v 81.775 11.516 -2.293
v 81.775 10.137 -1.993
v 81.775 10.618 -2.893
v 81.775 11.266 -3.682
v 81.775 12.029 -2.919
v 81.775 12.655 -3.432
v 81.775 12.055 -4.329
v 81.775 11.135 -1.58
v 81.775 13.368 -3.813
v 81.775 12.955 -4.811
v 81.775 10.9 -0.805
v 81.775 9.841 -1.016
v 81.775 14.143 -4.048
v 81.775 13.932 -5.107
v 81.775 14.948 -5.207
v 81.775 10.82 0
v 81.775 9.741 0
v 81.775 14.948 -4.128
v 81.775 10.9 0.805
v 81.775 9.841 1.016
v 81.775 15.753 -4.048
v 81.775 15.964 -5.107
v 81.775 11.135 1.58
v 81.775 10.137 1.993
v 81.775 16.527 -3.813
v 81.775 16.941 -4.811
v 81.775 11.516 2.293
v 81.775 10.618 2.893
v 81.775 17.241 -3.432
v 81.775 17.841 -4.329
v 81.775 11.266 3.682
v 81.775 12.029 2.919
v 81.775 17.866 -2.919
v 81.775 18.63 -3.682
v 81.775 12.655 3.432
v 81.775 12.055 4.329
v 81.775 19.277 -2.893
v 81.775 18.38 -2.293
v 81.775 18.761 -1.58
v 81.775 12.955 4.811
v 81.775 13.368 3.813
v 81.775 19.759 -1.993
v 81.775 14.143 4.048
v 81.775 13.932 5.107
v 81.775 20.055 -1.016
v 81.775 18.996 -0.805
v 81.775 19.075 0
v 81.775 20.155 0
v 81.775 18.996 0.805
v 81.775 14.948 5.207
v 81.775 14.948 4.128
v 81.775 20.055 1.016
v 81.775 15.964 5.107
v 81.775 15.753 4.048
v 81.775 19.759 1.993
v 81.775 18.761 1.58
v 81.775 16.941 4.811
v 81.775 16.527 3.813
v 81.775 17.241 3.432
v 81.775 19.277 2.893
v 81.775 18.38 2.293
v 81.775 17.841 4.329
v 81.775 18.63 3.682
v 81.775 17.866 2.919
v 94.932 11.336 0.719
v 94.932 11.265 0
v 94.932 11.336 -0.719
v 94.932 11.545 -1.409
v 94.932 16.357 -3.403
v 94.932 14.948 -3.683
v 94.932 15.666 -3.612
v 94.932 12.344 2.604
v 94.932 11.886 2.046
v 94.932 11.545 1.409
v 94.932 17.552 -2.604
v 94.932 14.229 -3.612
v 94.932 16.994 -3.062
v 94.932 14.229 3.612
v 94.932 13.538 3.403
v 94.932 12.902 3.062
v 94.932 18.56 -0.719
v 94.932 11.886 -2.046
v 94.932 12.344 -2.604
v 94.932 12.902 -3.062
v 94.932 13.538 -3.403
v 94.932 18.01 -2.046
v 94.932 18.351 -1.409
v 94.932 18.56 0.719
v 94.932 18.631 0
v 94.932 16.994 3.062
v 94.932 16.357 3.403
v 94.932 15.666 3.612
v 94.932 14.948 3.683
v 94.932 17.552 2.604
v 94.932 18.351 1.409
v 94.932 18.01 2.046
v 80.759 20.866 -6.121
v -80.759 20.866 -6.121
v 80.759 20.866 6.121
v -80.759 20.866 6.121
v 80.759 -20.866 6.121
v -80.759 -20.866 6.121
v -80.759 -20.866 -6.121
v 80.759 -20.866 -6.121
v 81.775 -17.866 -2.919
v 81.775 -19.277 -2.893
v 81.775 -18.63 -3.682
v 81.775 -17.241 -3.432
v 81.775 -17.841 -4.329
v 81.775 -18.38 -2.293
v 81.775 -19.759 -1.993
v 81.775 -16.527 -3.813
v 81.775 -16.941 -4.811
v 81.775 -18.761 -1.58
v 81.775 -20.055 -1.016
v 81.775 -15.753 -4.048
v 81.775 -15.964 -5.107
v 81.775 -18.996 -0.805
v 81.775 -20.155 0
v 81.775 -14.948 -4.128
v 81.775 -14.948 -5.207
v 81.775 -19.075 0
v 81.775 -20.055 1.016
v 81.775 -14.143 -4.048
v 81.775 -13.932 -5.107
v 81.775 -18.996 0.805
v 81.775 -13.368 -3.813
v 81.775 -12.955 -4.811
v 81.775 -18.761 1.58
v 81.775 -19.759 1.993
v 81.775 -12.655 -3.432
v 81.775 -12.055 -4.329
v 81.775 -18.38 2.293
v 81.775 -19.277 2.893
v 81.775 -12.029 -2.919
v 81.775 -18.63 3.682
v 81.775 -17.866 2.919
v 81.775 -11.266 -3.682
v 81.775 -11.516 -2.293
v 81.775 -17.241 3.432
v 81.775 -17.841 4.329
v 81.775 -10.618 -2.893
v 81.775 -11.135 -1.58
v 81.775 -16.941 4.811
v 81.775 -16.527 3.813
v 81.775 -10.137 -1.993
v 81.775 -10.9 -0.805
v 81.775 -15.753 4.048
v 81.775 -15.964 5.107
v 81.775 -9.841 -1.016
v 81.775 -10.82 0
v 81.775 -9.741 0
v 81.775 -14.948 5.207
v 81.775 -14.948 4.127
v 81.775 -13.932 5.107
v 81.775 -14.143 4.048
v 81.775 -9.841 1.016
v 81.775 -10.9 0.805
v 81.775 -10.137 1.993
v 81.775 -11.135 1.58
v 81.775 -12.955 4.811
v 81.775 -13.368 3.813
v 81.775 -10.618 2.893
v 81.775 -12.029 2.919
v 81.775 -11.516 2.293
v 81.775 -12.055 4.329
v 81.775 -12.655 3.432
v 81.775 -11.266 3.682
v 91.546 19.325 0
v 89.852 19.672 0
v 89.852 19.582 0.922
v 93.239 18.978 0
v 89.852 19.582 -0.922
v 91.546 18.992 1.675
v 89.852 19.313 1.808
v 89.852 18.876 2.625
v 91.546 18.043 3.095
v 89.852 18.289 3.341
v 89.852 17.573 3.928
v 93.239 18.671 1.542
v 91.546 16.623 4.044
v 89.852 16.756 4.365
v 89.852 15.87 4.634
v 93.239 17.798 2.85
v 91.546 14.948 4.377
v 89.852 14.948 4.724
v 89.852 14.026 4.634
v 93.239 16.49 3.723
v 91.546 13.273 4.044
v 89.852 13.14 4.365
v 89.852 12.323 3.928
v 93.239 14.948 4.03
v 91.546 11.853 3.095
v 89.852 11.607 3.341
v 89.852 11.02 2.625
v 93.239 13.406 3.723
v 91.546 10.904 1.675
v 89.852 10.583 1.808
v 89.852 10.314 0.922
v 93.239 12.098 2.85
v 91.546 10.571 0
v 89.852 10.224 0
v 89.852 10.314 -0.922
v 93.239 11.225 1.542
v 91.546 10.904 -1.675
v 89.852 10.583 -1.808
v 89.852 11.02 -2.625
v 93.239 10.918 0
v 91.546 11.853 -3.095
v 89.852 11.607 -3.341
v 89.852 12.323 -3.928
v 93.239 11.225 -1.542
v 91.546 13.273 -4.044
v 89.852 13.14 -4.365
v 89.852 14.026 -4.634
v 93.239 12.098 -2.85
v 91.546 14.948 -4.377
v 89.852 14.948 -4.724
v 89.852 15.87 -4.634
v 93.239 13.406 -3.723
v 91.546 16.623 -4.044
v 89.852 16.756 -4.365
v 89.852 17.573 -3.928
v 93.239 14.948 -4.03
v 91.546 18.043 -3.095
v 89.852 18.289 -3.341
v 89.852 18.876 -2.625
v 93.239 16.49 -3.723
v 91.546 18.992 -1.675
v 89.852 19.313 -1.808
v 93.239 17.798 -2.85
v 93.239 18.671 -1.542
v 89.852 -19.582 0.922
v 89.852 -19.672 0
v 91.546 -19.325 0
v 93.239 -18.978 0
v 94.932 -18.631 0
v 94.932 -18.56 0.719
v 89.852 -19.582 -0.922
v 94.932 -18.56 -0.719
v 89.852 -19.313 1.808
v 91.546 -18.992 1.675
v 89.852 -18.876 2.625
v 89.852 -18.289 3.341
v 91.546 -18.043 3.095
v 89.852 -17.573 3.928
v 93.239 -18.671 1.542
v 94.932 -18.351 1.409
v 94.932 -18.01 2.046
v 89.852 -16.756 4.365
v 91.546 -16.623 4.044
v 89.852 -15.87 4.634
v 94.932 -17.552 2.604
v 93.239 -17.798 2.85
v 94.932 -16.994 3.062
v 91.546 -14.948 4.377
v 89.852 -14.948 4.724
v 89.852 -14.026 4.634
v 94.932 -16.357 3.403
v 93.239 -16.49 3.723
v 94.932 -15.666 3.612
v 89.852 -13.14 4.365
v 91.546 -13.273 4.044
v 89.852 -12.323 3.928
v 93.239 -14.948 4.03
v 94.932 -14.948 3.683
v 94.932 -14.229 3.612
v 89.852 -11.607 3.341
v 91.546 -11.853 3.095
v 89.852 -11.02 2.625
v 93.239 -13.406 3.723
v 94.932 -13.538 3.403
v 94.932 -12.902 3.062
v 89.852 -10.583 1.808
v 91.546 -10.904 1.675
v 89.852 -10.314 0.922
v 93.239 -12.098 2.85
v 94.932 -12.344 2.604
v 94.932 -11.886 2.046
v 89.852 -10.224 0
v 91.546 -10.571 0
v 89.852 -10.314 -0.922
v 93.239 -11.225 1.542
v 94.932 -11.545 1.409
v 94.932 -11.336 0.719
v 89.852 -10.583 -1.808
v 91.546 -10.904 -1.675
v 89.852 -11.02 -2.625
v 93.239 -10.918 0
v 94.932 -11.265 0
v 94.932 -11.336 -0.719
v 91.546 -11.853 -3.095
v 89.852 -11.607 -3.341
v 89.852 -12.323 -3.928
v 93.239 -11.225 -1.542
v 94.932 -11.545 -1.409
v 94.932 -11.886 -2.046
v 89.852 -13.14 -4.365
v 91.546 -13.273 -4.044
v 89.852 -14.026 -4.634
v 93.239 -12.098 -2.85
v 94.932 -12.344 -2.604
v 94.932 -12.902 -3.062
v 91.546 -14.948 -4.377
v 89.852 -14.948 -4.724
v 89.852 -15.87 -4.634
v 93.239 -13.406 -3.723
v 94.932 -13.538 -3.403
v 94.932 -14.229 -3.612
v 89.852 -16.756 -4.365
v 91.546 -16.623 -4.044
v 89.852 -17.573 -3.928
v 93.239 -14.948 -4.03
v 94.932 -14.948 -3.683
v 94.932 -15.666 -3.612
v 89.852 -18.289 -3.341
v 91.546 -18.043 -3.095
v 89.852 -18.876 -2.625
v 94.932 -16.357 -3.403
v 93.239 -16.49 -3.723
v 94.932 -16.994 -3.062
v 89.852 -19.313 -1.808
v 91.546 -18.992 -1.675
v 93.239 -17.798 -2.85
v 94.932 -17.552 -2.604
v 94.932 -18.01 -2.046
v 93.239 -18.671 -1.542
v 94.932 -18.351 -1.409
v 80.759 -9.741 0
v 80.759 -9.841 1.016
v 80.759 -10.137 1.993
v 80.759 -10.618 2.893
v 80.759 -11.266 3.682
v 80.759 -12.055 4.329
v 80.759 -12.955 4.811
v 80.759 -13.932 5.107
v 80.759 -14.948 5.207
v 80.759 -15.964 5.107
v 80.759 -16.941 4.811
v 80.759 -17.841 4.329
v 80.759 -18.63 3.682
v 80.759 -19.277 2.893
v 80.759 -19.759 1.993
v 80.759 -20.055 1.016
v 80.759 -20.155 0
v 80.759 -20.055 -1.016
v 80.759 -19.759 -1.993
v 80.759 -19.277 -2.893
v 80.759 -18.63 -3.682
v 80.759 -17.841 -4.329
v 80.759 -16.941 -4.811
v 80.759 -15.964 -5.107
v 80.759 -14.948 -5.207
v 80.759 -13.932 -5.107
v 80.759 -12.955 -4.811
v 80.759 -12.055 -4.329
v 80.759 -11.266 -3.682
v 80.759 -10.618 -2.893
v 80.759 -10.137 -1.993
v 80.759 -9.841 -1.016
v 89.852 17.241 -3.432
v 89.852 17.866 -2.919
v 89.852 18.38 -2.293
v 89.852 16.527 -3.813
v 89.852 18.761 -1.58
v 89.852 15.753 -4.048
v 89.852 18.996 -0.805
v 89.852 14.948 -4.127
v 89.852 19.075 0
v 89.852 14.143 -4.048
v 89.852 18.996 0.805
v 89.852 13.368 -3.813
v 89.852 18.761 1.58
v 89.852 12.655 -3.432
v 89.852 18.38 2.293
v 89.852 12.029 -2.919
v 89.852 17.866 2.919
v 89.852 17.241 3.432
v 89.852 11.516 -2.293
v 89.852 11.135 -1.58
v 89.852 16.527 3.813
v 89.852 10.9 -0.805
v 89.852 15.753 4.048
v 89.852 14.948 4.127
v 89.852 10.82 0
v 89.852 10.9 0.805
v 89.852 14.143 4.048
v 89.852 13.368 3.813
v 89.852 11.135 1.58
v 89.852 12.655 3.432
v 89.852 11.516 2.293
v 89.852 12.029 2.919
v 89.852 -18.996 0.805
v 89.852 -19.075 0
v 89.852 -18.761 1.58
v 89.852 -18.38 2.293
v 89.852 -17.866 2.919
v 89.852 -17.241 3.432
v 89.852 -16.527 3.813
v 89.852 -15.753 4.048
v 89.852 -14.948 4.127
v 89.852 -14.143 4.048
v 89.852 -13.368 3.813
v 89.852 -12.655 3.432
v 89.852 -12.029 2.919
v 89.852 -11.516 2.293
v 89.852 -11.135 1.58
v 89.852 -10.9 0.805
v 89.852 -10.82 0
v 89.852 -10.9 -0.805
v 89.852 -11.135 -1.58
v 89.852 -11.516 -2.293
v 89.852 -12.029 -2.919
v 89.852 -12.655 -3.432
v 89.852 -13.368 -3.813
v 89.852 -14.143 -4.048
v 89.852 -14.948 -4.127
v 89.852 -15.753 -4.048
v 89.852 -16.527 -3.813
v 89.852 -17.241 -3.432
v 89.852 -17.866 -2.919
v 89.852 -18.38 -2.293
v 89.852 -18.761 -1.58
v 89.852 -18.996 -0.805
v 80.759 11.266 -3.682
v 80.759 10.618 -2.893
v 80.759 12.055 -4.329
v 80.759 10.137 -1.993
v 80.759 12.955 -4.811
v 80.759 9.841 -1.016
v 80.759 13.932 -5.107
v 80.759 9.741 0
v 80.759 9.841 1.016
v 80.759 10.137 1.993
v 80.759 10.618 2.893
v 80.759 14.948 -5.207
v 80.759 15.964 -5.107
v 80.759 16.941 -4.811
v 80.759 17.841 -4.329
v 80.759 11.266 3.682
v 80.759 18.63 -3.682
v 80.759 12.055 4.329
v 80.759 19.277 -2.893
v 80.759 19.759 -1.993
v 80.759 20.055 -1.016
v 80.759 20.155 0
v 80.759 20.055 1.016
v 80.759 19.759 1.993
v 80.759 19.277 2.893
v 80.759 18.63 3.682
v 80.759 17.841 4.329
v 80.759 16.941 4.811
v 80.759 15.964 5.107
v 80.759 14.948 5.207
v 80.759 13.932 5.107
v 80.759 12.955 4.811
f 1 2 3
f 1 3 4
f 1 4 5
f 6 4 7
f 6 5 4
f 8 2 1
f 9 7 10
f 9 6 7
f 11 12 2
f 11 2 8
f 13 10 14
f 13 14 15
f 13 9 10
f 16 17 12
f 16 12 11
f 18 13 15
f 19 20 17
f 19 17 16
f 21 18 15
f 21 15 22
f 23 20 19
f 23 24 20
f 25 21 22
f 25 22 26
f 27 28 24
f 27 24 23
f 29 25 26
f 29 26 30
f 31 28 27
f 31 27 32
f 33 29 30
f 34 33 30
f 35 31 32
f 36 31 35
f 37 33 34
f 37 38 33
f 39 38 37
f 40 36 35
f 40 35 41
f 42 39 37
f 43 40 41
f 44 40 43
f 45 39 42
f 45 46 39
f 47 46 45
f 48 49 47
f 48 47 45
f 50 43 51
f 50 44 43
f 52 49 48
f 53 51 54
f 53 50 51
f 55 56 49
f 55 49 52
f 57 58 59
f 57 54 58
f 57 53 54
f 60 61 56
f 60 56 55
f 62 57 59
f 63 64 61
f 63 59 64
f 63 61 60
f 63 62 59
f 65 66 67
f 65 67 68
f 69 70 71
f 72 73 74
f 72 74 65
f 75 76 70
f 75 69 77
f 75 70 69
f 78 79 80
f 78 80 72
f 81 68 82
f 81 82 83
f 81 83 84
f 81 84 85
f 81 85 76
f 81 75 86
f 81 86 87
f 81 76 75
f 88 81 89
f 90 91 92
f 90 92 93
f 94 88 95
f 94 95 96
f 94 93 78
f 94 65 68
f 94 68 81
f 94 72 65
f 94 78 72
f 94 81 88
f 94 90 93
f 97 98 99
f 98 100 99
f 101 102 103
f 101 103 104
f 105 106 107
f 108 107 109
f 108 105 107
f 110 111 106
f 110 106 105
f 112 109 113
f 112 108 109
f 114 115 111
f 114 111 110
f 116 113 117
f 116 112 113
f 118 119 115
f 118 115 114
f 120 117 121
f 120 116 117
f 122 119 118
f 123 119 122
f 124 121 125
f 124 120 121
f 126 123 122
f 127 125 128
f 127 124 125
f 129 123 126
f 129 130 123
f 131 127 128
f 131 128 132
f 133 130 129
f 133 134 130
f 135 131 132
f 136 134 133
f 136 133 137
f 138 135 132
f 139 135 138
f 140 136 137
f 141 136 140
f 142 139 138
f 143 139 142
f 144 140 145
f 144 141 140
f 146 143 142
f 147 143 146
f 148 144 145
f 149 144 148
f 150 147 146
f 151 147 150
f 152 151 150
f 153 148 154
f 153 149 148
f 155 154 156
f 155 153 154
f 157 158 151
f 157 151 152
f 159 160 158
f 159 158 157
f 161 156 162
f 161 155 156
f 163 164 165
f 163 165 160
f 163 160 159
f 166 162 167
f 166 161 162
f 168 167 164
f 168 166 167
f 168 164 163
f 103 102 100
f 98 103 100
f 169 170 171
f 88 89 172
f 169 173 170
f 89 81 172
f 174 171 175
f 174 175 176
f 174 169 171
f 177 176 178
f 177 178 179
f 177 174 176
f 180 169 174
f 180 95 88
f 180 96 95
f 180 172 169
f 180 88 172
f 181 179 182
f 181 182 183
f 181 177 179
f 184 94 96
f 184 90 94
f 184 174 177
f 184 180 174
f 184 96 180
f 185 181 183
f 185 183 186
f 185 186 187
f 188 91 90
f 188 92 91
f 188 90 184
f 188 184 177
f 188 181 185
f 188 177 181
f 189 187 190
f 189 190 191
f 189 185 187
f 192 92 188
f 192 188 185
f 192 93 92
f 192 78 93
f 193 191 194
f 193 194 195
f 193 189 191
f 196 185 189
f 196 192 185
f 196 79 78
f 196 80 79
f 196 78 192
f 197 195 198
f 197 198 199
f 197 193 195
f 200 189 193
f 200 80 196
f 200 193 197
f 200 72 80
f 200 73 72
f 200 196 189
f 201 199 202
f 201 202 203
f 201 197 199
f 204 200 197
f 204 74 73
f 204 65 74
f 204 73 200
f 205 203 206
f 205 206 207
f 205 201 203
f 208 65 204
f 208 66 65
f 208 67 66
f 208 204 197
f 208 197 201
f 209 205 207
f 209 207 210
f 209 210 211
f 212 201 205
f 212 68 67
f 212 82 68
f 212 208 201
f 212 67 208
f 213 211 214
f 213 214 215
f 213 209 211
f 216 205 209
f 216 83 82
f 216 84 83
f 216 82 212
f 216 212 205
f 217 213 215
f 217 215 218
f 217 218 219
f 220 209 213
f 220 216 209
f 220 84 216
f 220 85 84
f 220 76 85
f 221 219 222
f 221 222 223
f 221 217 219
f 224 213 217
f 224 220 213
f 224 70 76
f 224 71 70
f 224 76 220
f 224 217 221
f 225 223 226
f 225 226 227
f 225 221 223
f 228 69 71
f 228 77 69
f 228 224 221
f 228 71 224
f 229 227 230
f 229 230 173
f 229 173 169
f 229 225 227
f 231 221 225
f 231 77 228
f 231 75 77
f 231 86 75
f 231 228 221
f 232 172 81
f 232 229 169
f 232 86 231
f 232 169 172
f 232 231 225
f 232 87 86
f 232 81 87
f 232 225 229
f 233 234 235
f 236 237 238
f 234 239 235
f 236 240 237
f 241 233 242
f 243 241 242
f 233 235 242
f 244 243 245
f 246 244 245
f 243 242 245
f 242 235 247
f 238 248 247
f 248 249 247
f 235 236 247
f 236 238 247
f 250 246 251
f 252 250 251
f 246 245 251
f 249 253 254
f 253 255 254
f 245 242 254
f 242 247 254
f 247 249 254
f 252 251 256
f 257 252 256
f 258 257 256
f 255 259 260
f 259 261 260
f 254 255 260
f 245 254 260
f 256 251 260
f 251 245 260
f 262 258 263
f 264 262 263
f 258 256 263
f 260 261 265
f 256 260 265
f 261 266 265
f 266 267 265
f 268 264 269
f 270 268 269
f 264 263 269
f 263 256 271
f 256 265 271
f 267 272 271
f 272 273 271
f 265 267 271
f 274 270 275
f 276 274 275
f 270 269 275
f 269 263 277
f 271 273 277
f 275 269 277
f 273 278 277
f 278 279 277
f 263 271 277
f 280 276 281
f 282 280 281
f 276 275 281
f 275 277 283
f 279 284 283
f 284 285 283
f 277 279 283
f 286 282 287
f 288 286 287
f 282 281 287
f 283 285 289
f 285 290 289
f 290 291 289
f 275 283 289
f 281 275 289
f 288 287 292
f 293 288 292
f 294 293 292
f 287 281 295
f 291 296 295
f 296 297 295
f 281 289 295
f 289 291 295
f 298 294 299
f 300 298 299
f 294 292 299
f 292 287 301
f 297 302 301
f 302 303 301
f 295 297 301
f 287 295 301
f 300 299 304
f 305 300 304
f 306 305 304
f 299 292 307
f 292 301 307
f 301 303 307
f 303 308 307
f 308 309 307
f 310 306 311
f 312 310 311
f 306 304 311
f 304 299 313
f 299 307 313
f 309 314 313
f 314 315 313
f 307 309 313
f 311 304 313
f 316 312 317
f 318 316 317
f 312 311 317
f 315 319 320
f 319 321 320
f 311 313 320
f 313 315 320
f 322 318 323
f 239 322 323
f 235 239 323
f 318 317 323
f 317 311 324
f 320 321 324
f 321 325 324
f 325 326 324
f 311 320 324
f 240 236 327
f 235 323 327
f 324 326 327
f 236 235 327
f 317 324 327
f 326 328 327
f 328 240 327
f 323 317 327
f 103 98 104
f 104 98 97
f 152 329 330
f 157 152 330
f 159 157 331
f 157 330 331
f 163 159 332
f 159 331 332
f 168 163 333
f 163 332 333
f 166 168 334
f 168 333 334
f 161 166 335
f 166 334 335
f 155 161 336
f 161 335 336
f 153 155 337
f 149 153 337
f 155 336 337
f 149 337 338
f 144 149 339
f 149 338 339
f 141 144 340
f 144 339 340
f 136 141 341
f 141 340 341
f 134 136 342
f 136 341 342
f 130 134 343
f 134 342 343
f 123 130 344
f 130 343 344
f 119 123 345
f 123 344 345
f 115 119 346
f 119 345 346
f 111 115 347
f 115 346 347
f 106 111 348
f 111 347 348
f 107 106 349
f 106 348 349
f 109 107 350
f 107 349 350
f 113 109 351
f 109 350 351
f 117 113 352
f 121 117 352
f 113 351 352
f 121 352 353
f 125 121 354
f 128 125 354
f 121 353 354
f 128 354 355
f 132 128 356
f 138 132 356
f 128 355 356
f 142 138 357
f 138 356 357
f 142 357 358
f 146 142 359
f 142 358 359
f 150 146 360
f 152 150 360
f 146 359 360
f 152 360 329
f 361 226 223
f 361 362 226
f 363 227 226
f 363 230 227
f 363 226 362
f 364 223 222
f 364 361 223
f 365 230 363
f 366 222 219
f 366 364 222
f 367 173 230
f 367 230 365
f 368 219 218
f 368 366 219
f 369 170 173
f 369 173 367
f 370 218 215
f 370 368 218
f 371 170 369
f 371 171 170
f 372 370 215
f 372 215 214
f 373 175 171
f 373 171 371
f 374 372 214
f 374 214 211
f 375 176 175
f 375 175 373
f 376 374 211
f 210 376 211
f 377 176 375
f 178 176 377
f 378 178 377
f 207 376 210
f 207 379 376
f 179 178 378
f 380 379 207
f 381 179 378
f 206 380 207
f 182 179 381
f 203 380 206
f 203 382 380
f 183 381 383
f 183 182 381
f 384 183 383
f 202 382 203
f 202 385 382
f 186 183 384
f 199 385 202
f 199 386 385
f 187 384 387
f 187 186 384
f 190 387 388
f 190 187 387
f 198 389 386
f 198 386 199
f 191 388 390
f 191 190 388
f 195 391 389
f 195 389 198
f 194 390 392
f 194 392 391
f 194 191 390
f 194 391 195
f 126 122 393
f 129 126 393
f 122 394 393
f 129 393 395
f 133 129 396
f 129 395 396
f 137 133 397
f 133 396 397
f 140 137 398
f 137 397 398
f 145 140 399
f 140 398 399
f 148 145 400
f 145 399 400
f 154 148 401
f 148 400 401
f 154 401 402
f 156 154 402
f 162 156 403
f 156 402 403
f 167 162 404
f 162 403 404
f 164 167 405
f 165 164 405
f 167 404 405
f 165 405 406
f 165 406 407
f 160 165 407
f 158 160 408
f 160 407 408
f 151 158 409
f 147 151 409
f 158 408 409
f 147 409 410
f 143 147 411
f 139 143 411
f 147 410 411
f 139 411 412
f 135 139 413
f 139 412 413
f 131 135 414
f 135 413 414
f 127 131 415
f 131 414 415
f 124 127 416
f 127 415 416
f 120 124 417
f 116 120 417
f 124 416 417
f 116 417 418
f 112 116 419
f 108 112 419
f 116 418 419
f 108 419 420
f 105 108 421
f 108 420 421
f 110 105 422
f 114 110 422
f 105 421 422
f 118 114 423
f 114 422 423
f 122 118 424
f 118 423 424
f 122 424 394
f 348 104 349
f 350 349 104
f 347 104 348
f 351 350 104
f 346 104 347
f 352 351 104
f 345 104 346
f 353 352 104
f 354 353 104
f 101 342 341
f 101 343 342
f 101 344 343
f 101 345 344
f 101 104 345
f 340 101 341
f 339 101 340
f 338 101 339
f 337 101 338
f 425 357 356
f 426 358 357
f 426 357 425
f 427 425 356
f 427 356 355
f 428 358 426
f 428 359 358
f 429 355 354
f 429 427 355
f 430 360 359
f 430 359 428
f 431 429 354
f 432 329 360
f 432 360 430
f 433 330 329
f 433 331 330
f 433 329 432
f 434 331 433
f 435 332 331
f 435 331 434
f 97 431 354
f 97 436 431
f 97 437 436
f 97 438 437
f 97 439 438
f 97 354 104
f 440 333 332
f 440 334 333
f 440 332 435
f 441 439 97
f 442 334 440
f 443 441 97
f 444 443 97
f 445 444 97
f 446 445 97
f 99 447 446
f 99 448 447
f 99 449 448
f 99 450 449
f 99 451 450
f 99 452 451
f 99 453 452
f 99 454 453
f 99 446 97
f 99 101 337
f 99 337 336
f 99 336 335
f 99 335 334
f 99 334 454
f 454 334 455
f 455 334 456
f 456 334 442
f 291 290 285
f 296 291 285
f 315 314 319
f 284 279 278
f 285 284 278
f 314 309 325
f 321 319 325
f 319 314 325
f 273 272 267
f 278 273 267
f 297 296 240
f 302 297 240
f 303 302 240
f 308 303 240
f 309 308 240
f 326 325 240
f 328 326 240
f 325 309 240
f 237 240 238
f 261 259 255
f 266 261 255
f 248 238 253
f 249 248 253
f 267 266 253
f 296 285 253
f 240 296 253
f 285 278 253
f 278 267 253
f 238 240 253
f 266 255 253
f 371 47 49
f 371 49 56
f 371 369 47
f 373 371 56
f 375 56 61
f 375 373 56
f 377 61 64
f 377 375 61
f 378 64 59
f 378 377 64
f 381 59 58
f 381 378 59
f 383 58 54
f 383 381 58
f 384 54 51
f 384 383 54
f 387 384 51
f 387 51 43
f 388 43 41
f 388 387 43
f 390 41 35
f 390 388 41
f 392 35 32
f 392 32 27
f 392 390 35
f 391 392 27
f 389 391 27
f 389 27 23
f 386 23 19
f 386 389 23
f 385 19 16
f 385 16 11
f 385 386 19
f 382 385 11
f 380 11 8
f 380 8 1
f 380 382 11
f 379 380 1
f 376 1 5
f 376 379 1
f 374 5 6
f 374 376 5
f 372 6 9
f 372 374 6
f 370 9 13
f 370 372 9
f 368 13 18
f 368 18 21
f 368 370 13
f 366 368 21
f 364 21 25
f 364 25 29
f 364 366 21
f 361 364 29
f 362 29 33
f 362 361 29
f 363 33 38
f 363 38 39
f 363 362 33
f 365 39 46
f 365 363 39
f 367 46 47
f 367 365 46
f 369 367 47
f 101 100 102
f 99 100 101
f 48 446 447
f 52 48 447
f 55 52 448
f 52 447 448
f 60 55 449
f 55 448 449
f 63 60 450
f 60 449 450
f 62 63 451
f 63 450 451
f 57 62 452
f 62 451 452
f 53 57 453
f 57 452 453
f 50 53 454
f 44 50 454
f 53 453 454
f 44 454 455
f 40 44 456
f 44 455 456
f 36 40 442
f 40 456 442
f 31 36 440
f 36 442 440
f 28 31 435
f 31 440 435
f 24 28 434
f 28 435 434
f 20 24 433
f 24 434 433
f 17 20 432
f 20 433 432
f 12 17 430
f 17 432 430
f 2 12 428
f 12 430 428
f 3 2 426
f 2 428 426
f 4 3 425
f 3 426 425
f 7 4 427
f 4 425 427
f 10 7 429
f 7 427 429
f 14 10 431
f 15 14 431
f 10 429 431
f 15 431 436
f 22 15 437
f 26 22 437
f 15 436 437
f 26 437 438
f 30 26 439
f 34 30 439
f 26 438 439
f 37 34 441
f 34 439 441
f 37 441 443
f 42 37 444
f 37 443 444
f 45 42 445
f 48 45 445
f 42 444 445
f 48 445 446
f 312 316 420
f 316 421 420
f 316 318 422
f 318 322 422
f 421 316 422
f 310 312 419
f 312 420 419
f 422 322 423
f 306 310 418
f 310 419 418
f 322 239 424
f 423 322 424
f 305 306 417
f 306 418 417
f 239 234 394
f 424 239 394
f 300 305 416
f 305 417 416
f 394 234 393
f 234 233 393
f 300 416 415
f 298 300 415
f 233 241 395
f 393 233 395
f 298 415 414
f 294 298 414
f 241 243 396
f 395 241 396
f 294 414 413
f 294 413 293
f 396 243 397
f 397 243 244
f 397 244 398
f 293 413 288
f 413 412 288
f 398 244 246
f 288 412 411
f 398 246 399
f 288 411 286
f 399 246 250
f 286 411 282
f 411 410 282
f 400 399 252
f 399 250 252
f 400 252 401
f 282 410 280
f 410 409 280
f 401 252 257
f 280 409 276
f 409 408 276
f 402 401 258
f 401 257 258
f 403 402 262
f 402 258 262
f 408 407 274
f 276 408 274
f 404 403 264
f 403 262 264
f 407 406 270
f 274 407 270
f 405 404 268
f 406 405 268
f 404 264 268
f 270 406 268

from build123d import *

# Parameters (mm, degrees)
F0_W     = 161.5186
F0_H     = 41.7322
F1_DEPTH = 6.1214
F7_R     = 5.207
F7_R_2   = 4.1275
F8_DEPTH = 1.016


with BuildPart() as f1:
    # F0 (on Top) → F1 (new body, symmetric)
    with BuildSketch(Plane.XY):
        Rectangle(F0_W, F0_H)
    extrude(amount=F1_DEPTH, both=True)

    # F2 (on Top) → F3 (revolve)
    with BuildSketch(Plane.XY):
        Polygon((80.7593, -14.9479), (80.7593, -19.0754), (89.8525, -19.0754), (89.8525, -19.6723), (94.9325, -18.6309), (94.9325, -14.9479), align=None)
    revolve(axis=Axis((87.8459, -14.9479, 0), (-1, 0, 0)))

    # F4: F1 across plane


with BuildPart() as f1_1:
    add(f1.part)
    add(f1.part.mirror(Plane.XZ))

    # F7 (on face) → F8 (join)
    with BuildSketch(Plane.YZ.offset(80.7593)):
        with Locations((-14.9479, 0)):
            Circle(F7_R)
        with Locations((-14.9479, 0)):
            Circle(F7_R_2, mode=Mode.SUBTRACT)
        with Locations((14.9479, 0)):
            Circle(F7_R)
        with Locations((14.9479, 0)):
            Circle(F7_R_2, mode=Mode.SUBTRACT)
    extrude(amount=F8_DEPTH)


solid = f1_1.part
